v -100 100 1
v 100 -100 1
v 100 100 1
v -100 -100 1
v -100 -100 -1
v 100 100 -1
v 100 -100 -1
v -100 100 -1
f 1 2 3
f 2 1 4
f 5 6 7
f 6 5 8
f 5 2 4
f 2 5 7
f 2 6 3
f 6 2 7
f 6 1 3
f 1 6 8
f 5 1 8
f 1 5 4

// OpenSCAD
// Parameters
sheet_length = 200; //[100:400:1]
sheet_width  = 200; //[100:400:1]
sheet_thickness = 2; //[1:4:0.5]

// Ensure renderable thickness (avoid near-zero that can look blank in some viewers)
min_t = 0.5;
t = max(sheet_thickness, min_t);

// Geometry
module sheet_body() {
  cube([sheet_length, sheet_width, t], center=true);
}

// Final Output (one connected solid)
sheet_body();
